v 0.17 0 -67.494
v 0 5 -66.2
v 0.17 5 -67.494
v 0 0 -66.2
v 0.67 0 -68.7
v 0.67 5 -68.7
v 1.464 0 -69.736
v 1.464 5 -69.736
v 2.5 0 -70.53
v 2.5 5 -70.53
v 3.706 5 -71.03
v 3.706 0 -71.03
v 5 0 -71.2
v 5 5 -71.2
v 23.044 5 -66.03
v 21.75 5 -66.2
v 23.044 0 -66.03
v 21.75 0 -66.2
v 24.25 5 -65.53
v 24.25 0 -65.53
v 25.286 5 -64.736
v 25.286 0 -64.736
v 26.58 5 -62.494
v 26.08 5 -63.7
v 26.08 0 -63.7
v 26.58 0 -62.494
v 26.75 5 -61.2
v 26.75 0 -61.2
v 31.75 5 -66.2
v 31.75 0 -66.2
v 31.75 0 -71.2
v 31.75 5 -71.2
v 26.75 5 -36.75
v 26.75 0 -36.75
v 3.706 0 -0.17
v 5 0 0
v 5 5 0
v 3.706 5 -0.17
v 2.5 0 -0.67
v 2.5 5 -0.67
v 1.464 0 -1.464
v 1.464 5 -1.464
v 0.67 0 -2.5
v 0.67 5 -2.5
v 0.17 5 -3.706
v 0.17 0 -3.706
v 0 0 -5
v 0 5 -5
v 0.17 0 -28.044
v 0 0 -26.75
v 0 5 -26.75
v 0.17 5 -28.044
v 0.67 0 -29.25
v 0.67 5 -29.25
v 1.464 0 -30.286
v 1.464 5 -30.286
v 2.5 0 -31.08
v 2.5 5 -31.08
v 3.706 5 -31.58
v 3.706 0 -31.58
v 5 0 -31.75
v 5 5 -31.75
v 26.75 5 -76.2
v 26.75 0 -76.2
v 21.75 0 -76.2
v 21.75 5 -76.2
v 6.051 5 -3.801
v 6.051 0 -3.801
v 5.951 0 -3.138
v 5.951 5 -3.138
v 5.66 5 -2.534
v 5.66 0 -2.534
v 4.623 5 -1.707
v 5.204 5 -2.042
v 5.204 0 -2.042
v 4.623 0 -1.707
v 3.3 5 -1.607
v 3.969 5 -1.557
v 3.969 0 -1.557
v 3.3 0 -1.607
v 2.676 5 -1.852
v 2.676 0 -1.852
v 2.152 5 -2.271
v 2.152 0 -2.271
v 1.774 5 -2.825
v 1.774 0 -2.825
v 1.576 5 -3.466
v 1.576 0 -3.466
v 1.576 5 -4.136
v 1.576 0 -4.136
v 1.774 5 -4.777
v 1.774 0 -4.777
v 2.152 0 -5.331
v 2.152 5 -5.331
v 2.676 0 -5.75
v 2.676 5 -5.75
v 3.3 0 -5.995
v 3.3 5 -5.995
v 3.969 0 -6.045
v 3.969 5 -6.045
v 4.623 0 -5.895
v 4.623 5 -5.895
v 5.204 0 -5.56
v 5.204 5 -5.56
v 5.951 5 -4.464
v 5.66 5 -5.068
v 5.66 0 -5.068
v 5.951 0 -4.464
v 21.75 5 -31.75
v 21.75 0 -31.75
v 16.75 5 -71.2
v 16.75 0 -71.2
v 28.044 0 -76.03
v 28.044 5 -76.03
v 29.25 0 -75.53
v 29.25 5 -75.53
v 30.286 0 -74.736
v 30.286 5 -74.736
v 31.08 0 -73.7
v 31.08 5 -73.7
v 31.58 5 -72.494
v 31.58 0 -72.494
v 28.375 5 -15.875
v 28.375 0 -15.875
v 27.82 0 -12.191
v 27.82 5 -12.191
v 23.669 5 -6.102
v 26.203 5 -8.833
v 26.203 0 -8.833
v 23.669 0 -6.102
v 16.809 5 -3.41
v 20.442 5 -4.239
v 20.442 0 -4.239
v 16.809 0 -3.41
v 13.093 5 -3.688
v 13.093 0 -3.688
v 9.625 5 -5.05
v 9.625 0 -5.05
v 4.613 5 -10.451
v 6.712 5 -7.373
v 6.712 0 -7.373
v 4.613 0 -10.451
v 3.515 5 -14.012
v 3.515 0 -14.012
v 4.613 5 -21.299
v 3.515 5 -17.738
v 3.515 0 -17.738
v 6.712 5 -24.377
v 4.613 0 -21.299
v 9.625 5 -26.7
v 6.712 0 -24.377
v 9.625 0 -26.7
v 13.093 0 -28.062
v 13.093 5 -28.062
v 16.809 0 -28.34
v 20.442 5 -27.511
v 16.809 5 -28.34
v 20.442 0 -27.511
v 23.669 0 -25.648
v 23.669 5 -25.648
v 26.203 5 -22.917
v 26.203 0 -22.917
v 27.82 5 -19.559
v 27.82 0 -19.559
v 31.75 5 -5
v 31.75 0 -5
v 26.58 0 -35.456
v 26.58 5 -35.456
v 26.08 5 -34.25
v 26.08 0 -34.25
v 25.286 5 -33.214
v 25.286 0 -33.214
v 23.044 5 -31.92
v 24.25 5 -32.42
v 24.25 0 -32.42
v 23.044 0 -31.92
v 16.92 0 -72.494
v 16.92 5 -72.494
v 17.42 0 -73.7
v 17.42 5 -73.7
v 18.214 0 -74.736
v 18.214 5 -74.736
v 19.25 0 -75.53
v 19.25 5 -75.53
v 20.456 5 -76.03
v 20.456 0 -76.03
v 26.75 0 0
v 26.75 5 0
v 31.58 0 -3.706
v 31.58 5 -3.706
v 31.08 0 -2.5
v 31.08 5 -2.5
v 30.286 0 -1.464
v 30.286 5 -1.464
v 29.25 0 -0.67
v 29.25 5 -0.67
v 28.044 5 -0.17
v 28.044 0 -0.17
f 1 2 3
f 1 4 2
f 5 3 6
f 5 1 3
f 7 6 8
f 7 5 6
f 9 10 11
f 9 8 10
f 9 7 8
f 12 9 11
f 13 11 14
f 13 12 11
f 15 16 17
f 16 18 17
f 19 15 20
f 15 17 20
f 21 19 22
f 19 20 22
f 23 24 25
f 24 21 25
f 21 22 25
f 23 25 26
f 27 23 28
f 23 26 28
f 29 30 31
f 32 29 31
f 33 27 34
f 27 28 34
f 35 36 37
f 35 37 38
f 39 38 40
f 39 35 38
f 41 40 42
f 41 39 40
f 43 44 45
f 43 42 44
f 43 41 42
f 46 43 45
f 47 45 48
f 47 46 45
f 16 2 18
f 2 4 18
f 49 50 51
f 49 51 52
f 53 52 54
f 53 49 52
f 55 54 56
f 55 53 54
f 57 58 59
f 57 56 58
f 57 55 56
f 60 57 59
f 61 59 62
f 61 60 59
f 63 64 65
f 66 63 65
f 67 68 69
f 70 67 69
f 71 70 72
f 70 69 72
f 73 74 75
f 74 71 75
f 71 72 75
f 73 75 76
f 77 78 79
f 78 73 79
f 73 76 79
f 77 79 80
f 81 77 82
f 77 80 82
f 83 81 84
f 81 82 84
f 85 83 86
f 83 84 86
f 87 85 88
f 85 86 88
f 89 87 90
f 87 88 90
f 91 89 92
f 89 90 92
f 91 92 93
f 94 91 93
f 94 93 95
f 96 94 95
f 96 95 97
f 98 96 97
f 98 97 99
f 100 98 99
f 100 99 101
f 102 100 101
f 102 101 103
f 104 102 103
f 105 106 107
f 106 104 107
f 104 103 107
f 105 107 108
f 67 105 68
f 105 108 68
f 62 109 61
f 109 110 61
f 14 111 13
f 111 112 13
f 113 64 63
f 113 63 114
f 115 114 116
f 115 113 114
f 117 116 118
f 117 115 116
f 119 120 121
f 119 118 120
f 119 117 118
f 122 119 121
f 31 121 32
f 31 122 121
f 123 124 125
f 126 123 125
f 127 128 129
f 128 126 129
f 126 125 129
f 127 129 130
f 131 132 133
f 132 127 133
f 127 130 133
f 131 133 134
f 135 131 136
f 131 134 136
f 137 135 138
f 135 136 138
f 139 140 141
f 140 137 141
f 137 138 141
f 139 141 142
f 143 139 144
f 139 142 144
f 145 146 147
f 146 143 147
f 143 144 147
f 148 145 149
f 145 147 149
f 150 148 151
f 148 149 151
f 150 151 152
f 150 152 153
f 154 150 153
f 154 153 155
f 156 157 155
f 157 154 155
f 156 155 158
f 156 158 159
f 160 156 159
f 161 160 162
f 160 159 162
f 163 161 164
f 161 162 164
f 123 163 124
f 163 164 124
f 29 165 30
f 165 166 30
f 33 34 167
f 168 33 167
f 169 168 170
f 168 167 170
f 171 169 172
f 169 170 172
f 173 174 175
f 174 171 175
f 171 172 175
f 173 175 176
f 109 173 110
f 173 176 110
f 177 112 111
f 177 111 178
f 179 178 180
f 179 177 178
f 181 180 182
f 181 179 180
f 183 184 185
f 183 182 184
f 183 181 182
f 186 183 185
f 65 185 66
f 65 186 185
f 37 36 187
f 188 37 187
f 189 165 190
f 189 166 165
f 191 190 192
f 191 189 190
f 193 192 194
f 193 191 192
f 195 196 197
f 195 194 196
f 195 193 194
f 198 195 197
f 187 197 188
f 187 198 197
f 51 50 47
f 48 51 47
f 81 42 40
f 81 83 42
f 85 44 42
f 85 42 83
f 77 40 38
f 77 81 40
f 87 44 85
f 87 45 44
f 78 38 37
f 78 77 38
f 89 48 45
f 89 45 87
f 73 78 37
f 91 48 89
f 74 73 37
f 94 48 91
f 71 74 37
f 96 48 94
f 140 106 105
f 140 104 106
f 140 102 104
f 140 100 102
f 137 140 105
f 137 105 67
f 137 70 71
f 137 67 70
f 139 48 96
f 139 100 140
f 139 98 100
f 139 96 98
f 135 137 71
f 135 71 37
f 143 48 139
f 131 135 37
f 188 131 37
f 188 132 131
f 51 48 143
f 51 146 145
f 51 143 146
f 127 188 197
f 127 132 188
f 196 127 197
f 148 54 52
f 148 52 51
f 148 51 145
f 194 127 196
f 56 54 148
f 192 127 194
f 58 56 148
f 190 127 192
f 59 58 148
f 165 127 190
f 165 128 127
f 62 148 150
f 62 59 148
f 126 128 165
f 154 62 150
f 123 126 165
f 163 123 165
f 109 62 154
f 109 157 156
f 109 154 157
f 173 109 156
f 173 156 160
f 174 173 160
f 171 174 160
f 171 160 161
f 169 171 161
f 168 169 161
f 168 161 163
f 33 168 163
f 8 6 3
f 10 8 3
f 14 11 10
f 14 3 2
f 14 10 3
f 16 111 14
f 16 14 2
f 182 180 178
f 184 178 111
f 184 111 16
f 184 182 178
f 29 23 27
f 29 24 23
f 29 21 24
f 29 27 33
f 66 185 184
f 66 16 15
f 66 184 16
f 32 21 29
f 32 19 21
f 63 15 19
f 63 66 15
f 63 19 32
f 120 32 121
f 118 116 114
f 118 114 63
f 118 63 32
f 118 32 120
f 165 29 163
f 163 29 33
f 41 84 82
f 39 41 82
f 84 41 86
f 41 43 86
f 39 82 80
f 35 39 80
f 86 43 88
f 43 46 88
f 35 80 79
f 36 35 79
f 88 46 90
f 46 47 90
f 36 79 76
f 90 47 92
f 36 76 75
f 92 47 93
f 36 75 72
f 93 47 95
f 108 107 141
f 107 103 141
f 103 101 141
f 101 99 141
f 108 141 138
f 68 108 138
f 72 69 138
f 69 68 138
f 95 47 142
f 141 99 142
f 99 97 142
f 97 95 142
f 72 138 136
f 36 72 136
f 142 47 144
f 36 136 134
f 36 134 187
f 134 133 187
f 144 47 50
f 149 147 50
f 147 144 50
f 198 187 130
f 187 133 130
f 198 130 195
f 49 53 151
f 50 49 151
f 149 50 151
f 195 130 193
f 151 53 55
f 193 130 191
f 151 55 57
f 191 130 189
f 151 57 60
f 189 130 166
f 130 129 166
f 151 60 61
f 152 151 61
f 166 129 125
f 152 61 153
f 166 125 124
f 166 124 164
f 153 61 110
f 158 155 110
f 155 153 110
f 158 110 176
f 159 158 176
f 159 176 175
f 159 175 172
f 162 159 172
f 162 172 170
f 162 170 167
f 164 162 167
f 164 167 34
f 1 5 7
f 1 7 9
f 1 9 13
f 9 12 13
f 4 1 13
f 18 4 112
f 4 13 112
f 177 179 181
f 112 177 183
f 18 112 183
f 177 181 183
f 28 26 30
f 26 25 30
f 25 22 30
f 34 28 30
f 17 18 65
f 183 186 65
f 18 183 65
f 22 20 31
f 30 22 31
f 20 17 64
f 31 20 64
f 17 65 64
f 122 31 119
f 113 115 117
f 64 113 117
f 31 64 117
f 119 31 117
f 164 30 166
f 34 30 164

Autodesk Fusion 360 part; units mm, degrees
sketch "Sketch1" plane through (0, 0, 0) normal (0, 1, 0) x (1, 0, 0)
  line L0 (5, 0) -> (26.75, 0)
  line L1 (31.75, 5) -> (31.75, 76.2)
  line L2 (26.75, 76.2) -> (21.75, 76.2)
  line L3 (16.75, 71.2) -> (16.75, 71.2)
  line L4 (16.75, 71.2) -> (5, 71.2)
  line L5 (0, 66.2) -> (0, 66.2)
  line L6 (31.75, 71.2) -> (31.75, 66.2)
  line L7 (0, 66.2) -> (21.75, 66.2)
  line L8 (26.75, 61.2) -> (26.75, 36.75)
  line L9 (21.75, 31.75) -> (5, 31.75)
  line L10 (0, 26.75) -> (0, 5)
  arc A0 (21.75, 76.2) -> (16.75, 71.2) centre (21.75, 71.2) ccw
  arc A1 (31.75, 71.2) -> (26.75, 76.2) centre (26.75, 71.2) ccw
  arc A2 (5, 71.2) -> (0, 66.2) centre (5, 66.2) ccw
  arc A3 (26.75, 61.2) -> (21.75, 66.2) centre (21.75, 61.2) ccw
  arc A4 (21.75, 31.75) -> (26.75, 36.75) centre (21.75, 36.75) ccw
  arc A5 (5, 31.75) -> (0, 26.75) centre (5, 26.75) ccw
  arc A6 (0, 5) -> (5, 0) centre (5, 5) ccw
  arc A7 (26.75, 0) -> (31.75, 5) centre (26.75, 5) ccw
  circle A8 centre (15.875, 15.875) radius 12.5
  circle A9 centre (3.801, 3.801) radius 2.25
  dimension "d12" = 25
extrude "Extrude1" add sketch "Sketch1" along normal blind 5
sketch "Sketch2" plane through (0, 0, 0) normal (1, 0, 0) x (0, 0, -1)
